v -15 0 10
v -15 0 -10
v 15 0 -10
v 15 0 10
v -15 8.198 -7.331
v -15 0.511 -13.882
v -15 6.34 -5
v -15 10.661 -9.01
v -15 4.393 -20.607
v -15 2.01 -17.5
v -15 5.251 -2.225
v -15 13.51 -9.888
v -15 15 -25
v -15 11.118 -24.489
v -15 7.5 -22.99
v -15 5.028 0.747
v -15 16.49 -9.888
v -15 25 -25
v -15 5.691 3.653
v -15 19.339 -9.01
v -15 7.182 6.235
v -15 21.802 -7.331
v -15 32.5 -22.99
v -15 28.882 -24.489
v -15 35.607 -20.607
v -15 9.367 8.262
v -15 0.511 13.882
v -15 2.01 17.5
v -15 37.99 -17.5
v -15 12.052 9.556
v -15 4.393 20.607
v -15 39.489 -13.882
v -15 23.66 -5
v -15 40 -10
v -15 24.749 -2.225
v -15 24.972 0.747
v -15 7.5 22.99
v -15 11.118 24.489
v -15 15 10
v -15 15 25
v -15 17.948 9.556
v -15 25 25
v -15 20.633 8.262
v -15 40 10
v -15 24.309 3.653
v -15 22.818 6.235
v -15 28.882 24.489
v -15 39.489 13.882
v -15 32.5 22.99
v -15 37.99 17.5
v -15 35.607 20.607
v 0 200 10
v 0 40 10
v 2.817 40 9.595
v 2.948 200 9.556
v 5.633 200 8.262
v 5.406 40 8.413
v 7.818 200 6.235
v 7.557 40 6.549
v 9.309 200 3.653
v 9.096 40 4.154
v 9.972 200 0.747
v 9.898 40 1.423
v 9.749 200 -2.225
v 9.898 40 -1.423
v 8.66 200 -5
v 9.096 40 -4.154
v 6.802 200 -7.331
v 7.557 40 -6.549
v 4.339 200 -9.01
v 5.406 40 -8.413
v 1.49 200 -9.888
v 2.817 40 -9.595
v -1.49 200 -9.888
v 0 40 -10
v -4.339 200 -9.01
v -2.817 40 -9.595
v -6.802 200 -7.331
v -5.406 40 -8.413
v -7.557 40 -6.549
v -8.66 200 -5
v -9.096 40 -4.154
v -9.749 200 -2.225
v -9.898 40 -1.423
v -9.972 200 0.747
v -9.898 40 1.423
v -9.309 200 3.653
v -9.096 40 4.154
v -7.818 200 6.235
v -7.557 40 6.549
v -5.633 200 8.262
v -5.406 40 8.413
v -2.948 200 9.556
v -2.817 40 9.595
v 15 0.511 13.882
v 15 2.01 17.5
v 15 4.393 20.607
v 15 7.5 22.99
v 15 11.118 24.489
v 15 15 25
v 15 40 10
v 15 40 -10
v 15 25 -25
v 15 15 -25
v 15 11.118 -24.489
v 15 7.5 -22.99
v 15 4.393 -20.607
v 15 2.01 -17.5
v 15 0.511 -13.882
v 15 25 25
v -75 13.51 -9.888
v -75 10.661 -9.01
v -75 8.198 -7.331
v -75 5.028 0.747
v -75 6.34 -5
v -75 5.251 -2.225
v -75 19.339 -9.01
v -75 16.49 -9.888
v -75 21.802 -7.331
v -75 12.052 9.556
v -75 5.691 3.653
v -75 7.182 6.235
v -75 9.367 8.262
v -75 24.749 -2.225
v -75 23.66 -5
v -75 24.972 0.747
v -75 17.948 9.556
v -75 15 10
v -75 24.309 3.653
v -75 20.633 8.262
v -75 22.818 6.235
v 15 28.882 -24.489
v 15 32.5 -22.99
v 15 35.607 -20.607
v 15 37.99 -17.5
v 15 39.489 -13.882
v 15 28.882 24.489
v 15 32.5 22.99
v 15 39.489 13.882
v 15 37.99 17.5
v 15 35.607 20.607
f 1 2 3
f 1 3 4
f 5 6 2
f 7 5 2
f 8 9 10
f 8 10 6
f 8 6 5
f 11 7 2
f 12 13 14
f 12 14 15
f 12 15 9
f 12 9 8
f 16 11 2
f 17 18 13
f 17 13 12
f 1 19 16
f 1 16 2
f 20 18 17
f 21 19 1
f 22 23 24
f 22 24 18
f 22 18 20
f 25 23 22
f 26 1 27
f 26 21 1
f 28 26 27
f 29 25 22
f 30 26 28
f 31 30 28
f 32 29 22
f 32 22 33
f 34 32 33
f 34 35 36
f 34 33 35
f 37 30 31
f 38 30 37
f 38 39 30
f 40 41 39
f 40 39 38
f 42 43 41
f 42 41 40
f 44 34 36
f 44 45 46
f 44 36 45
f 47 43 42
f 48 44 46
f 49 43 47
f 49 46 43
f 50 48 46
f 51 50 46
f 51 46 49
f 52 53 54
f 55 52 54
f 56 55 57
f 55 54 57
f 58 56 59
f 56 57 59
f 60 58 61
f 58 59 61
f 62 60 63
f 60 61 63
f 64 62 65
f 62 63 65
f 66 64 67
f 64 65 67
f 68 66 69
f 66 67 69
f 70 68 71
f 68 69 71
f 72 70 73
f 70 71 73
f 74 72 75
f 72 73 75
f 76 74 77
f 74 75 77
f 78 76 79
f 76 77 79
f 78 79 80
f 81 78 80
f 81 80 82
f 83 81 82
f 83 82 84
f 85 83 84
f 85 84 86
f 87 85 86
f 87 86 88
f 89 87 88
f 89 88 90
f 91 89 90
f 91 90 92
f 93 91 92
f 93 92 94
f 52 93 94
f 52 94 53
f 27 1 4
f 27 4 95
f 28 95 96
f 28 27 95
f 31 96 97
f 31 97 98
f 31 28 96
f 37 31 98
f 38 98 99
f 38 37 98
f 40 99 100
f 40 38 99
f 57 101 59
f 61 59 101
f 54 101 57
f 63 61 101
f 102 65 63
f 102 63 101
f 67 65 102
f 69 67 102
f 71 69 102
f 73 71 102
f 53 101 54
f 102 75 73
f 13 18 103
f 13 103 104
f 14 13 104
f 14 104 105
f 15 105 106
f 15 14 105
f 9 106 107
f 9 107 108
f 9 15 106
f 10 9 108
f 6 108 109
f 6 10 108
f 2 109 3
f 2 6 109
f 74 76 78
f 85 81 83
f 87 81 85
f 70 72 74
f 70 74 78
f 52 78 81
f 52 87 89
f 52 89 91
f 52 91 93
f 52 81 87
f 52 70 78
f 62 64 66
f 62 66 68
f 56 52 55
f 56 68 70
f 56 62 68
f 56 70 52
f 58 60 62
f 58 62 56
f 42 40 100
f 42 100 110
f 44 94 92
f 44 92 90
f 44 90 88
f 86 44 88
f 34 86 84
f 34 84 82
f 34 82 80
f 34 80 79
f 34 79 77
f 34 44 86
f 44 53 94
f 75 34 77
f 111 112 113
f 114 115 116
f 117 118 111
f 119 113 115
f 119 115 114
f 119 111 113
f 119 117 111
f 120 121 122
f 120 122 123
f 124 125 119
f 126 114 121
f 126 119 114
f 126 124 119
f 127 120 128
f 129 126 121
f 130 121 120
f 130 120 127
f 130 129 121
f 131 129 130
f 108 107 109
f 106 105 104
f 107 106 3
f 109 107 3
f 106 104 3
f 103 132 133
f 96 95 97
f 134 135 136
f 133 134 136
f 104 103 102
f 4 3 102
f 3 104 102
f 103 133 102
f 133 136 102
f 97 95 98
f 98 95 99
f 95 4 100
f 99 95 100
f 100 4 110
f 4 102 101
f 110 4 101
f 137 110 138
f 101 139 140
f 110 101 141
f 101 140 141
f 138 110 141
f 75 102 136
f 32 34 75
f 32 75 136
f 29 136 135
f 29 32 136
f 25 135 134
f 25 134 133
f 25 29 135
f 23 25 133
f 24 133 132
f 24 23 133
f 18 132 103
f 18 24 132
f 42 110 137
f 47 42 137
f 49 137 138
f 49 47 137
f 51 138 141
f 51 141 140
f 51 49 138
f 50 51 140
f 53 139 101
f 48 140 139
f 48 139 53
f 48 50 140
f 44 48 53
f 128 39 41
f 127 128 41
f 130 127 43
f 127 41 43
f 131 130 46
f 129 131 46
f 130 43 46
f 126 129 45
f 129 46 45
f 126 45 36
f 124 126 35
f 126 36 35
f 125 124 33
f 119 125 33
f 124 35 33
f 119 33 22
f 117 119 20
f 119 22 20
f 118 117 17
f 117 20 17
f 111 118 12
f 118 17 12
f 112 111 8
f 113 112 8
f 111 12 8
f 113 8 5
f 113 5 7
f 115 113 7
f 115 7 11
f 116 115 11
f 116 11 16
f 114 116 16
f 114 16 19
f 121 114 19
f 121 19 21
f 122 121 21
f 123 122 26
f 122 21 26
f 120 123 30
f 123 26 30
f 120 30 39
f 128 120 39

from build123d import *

# Parameters (mm, degrees)
SKETCH_1_R           = 10
EXTRUDE_1_DEPTH      = 200
EXTRUDE_2_DEPTH      = 15
EXTRUDE_2_DEPTH_BACK = 15
SKETCH_4_R           = 10
EXTRUDE_3_DEPTH      = 60


with BuildPart() as part:
    # 草图1 → 凸台-拉伸1 (new body)
    with BuildSketch(Plane(origin=(0, 0, 0), x_dir=(1, 0, 0), z_dir=(0, 1, 0))):
        Circle(SKETCH_1_R)
    extrude(amount=EXTRUDE_1_DEPTH)

    # 草图2 → 凸台-拉伸2 (add, two sides: drawn at the far end of the back side and taken through both)
    with BuildSketch(Plane(origin=(0, 0, 0), x_dir=(0, 0, -1), z_dir=(1, 0, 0)).offset(-EXTRUDE_2_DEPTH_BACK)):
        with BuildLine():
            Line((-10, 40), (10, 40))
            ThreePointArc((10, 40), (20.606601718, 35.606601718), (25, 25))
            Line((25, 25), (25, 15))
            ThreePointArc((25, 15), (20.606601718, 4.393398282), (10, 0))
            Line((10, 0), (-10, 0))
            ThreePointArc((-10, 0), (-20.606601718, 4.393398282), (-25, 15))
            Line((-25, 15), (-25, 25))
            ThreePointArc((-25, 25), (-20.606601718, 35.606601718), (-10, 40))
        make_face()
    extrude(amount=EXTRUDE_2_DEPTH + EXTRUDE_2_DEPTH_BACK)

    # 草图4 → 凸台-拉伸3 (add)
    with BuildSketch(Plane.ZY.offset(15)):
        with Locations((0, 15)):
            Circle(SKETCH_4_R)
    extrude(amount=EXTRUDE_3_DEPTH)


solid = part.part
